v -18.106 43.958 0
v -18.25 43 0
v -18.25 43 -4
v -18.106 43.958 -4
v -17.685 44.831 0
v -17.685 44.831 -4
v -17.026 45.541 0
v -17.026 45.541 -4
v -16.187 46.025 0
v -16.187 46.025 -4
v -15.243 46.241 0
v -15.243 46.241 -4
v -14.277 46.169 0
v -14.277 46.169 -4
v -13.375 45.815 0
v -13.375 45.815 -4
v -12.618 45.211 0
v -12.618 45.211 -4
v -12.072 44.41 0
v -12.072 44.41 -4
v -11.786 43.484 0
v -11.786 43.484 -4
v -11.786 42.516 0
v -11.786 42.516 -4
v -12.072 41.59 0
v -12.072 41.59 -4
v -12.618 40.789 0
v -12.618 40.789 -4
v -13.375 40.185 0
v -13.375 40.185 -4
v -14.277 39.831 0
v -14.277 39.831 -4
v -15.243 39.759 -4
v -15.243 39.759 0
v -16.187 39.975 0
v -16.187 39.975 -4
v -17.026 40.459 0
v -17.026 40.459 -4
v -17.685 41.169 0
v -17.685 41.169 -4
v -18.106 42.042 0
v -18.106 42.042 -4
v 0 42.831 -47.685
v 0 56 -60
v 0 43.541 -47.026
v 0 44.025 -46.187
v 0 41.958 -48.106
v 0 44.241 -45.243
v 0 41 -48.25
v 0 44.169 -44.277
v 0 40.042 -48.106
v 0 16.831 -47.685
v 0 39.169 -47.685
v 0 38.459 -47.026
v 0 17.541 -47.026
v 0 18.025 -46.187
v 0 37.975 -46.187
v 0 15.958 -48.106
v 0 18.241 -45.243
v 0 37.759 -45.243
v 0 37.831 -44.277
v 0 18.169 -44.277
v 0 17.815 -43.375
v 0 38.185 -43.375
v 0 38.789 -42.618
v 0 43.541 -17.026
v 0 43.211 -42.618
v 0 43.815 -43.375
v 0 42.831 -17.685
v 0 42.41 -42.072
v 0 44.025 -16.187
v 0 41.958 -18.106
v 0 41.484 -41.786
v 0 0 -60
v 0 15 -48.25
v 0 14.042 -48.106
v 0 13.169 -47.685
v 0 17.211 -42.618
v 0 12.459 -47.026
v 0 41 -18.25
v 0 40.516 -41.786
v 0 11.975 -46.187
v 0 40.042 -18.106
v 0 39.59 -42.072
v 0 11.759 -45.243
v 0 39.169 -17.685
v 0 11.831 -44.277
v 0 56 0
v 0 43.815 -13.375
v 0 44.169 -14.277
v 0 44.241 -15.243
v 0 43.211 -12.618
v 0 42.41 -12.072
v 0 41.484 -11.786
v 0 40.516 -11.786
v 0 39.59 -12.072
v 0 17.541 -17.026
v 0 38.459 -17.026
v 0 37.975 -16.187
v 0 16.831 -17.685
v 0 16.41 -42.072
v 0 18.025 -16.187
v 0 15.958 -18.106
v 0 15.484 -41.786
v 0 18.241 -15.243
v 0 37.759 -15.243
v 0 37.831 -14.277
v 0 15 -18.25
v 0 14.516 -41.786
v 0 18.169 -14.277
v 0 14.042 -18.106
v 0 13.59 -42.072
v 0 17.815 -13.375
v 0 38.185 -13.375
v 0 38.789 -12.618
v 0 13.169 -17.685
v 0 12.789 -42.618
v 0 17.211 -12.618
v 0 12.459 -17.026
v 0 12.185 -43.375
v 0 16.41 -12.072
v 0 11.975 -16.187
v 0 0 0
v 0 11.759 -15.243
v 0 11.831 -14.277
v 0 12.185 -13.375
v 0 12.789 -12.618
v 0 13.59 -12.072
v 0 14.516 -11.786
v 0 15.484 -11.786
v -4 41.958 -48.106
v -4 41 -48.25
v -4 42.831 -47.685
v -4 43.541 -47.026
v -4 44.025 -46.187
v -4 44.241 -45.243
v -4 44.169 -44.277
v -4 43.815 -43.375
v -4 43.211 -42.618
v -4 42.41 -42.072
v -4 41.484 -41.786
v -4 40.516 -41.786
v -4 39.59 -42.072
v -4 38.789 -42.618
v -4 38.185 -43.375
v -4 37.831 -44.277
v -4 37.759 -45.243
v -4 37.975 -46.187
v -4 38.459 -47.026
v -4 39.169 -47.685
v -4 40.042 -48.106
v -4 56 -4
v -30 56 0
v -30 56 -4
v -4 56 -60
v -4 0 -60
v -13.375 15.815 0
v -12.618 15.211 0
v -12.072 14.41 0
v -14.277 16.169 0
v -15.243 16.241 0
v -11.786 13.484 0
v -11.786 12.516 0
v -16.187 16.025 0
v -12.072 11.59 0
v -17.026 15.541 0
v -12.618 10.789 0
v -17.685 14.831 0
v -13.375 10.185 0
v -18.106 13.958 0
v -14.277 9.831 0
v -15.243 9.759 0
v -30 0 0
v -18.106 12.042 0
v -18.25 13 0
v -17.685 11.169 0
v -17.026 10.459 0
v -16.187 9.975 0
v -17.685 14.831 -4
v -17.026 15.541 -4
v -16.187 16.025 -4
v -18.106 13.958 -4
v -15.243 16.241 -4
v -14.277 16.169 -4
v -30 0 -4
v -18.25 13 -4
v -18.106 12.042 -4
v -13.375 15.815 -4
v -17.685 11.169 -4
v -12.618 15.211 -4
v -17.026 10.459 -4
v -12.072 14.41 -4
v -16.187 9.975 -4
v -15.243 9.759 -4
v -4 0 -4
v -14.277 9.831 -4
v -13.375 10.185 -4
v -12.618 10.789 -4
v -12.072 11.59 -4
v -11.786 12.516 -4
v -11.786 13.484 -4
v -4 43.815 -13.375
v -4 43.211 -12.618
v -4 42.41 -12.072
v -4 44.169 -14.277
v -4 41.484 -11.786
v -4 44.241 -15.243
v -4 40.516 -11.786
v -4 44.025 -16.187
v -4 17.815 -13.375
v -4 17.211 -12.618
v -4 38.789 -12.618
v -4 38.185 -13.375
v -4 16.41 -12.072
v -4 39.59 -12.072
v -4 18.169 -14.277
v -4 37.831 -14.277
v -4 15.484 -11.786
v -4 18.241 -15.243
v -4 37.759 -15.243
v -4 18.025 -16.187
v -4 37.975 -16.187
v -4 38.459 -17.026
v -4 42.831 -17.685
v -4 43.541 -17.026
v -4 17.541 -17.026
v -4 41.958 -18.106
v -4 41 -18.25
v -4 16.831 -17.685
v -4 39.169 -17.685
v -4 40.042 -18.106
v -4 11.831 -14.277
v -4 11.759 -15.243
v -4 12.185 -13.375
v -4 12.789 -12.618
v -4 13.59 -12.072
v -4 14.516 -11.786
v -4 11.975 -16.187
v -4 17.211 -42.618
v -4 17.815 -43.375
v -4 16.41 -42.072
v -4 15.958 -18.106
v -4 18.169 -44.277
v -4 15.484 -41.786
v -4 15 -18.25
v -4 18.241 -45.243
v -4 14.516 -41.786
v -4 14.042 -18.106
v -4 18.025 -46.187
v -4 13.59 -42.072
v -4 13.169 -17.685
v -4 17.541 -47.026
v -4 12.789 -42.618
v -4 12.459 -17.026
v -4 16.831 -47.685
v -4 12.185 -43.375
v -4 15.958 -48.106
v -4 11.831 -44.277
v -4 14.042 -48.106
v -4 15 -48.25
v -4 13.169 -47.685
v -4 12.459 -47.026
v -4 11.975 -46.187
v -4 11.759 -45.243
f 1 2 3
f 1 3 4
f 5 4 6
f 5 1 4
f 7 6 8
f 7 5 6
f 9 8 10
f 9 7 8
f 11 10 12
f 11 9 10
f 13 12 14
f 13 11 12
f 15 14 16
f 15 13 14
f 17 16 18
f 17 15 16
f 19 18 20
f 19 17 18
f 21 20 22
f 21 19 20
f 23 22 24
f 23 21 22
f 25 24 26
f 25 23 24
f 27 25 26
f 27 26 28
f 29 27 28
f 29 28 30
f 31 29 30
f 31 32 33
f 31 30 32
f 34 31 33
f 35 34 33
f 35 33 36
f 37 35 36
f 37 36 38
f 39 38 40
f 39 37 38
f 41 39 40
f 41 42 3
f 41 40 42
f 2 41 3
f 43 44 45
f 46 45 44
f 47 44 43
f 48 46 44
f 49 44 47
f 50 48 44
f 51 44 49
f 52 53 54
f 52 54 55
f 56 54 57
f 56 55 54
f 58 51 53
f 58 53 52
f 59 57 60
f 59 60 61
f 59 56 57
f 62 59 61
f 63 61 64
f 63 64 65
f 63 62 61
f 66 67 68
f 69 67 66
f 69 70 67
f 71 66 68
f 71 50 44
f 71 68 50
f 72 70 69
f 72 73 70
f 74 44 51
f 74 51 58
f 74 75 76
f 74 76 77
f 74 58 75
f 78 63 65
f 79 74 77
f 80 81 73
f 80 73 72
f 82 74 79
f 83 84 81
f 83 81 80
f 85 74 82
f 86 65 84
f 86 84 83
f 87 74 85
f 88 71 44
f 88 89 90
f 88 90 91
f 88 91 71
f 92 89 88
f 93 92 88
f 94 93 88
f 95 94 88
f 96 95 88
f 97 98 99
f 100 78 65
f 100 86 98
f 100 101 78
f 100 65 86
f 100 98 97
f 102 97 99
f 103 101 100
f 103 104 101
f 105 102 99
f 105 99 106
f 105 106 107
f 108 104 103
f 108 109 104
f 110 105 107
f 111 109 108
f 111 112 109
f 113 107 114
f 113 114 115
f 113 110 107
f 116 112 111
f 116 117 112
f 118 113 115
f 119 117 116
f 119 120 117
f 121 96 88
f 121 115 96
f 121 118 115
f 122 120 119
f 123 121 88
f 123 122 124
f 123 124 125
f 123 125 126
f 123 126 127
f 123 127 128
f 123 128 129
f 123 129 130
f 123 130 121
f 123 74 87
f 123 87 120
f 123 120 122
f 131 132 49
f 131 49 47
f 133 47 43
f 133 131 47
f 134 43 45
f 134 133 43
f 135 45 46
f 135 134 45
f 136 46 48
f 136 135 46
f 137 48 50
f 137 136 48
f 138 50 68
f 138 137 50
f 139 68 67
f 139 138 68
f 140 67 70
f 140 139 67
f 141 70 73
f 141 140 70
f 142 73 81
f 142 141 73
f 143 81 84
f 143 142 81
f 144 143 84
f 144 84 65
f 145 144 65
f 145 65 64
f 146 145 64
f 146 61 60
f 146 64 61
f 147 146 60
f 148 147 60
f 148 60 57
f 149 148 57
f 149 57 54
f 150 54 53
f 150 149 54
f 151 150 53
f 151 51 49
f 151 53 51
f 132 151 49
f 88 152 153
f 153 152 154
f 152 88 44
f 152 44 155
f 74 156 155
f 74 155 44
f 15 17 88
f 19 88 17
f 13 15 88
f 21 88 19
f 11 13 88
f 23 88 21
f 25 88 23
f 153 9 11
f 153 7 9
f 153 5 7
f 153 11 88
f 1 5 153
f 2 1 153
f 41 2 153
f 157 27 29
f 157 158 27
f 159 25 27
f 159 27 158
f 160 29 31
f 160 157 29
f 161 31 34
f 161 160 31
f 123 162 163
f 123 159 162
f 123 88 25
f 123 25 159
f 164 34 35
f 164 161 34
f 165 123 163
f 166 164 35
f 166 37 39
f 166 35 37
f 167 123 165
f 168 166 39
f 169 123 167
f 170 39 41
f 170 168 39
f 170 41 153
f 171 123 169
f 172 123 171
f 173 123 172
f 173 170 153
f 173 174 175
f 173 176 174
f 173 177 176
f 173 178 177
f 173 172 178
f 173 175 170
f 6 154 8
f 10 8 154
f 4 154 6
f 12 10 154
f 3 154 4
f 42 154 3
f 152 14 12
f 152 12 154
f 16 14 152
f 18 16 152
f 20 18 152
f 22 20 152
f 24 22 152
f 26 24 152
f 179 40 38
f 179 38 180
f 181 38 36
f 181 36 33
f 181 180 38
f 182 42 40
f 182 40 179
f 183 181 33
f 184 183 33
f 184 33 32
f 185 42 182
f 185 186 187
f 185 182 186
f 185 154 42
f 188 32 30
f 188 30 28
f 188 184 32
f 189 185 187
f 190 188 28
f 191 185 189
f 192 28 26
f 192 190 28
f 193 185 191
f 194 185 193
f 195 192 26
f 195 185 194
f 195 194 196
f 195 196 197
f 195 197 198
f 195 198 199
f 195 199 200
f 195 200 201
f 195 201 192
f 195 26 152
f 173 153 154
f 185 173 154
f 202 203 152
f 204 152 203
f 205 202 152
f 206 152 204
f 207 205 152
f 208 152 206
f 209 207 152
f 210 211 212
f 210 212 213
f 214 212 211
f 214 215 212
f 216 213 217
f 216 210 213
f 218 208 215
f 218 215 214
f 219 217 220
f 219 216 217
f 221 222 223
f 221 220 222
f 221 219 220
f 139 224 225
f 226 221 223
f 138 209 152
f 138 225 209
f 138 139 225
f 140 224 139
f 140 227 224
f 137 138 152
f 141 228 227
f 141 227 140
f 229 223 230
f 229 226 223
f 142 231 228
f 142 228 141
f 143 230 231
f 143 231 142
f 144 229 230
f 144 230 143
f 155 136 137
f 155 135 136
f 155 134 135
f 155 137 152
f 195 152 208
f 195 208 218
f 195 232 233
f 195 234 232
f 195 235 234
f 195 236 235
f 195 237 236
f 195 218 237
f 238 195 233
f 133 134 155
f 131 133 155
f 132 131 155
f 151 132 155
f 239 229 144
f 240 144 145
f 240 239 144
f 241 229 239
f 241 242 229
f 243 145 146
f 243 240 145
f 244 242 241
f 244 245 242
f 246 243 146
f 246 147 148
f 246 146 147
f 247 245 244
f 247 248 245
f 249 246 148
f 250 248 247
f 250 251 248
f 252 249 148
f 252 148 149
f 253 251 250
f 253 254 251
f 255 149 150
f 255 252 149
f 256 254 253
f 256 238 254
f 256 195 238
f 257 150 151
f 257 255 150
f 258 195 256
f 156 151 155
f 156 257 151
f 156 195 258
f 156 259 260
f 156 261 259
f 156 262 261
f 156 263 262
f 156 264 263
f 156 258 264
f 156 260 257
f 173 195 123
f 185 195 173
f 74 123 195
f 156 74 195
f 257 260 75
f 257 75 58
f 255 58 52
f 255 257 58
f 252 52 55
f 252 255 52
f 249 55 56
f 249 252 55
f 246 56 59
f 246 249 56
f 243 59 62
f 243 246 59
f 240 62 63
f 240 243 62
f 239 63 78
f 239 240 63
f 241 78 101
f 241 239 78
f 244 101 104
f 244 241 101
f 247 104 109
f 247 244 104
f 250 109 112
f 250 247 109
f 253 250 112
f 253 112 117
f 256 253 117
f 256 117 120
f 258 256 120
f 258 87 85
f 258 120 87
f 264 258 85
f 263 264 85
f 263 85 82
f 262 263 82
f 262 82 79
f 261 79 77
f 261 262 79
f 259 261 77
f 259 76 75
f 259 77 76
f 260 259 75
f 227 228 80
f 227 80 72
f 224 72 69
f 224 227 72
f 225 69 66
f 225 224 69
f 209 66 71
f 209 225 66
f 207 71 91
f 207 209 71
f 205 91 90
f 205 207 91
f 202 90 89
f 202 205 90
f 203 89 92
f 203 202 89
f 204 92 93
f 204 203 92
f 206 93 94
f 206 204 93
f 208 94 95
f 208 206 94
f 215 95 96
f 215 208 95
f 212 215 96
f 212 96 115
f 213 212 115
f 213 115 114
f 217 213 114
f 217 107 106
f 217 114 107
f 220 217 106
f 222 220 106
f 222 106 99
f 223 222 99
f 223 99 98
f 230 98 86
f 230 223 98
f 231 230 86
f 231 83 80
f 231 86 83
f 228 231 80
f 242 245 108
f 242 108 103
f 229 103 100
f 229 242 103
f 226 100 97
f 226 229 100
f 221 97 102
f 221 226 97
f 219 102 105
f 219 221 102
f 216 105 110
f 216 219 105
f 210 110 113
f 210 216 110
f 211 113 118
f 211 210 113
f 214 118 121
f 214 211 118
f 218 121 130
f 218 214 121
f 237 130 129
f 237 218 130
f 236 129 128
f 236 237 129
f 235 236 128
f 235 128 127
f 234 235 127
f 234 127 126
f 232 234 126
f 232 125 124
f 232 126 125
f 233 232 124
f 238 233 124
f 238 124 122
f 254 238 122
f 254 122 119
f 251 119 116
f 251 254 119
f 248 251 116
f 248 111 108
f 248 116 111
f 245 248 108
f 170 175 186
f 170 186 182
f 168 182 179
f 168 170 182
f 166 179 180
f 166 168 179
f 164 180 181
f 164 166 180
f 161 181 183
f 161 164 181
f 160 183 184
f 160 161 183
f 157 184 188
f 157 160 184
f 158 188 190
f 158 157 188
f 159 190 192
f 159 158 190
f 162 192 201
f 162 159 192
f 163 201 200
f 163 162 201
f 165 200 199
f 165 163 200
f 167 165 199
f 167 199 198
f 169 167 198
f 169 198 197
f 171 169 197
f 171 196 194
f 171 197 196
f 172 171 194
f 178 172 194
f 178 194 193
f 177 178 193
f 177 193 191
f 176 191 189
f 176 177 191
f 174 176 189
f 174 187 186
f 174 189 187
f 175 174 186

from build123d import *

# Parameters (mm, degrees)
EXTRUDE_1_DEPTH          = 56
CUT_EXTRUDE_1_DEPTH      = 85.687661439
CUT_EXTRUDE_1_DEPTH_BACK = 85.687661439
SKETCH_2_R               = 3.25
CUT_EXTRUDE_2_DEPTH      = 88.3842091
CUT_EXTRUDE_2_DEPTH_BACK = 88.3842091
SKETCH_3_R               = 3.25


with BuildPart() as part:
    # 草图1 → 凸台-拉伸1 (new body)
    with BuildSketch(Plane(origin=(0, 0, 0), x_dir=(1, 0, 0), z_dir=(0, 1, 0))):
        Polygon((0, 0), (-30, 0), (-30, 4), (-4, 4), (-4, 60), (0, 60), align=None)
    extrude(amount=EXTRUDE_1_DEPTH)

    # 草图2 → 切除-拉伸1 (cut, two sides: drawn at the far end of the back side and taken through both)
    with BuildSketch(Plane(origin=(0, 0, -4), x_dir=(-1, 0, 0), z_dir=(0, 0, -1)).offset(-CUT_EXTRUDE_1_DEPTH_BACK)):
        with Locations((15, 43)):
            Circle(SKETCH_2_R)
        with Locations((15, 13)):
            Circle(SKETCH_2_R)
    extrude(amount=CUT_EXTRUDE_1_DEPTH + CUT_EXTRUDE_1_DEPTH_BACK, mode=Mode.SUBTRACT)

    # 草图3 → 切除-拉伸2 (cut, two sides: drawn at the far end of the back side and taken through both)
    with BuildSketch(Plane(origin=(0, 0, 0), x_dir=(0, 0, -1), z_dir=(1, 0, 0)).offset(-CUT_EXTRUDE_2_DEPTH_BACK)):
        with Locations((15, 41)):
            Circle(SKETCH_3_R)
        with Locations((15, 15)):
            Circle(SKETCH_3_R)
        with Locations((45, 15)):
            Circle(SKETCH_3_R)
        with Locations((45, 41)):
            Circle(SKETCH_3_R)
    extrude(amount=CUT_EXTRUDE_2_DEPTH + CUT_EXTRUDE_2_DEPTH_BACK, mode=Mode.SUBTRACT)


solid = part.part
